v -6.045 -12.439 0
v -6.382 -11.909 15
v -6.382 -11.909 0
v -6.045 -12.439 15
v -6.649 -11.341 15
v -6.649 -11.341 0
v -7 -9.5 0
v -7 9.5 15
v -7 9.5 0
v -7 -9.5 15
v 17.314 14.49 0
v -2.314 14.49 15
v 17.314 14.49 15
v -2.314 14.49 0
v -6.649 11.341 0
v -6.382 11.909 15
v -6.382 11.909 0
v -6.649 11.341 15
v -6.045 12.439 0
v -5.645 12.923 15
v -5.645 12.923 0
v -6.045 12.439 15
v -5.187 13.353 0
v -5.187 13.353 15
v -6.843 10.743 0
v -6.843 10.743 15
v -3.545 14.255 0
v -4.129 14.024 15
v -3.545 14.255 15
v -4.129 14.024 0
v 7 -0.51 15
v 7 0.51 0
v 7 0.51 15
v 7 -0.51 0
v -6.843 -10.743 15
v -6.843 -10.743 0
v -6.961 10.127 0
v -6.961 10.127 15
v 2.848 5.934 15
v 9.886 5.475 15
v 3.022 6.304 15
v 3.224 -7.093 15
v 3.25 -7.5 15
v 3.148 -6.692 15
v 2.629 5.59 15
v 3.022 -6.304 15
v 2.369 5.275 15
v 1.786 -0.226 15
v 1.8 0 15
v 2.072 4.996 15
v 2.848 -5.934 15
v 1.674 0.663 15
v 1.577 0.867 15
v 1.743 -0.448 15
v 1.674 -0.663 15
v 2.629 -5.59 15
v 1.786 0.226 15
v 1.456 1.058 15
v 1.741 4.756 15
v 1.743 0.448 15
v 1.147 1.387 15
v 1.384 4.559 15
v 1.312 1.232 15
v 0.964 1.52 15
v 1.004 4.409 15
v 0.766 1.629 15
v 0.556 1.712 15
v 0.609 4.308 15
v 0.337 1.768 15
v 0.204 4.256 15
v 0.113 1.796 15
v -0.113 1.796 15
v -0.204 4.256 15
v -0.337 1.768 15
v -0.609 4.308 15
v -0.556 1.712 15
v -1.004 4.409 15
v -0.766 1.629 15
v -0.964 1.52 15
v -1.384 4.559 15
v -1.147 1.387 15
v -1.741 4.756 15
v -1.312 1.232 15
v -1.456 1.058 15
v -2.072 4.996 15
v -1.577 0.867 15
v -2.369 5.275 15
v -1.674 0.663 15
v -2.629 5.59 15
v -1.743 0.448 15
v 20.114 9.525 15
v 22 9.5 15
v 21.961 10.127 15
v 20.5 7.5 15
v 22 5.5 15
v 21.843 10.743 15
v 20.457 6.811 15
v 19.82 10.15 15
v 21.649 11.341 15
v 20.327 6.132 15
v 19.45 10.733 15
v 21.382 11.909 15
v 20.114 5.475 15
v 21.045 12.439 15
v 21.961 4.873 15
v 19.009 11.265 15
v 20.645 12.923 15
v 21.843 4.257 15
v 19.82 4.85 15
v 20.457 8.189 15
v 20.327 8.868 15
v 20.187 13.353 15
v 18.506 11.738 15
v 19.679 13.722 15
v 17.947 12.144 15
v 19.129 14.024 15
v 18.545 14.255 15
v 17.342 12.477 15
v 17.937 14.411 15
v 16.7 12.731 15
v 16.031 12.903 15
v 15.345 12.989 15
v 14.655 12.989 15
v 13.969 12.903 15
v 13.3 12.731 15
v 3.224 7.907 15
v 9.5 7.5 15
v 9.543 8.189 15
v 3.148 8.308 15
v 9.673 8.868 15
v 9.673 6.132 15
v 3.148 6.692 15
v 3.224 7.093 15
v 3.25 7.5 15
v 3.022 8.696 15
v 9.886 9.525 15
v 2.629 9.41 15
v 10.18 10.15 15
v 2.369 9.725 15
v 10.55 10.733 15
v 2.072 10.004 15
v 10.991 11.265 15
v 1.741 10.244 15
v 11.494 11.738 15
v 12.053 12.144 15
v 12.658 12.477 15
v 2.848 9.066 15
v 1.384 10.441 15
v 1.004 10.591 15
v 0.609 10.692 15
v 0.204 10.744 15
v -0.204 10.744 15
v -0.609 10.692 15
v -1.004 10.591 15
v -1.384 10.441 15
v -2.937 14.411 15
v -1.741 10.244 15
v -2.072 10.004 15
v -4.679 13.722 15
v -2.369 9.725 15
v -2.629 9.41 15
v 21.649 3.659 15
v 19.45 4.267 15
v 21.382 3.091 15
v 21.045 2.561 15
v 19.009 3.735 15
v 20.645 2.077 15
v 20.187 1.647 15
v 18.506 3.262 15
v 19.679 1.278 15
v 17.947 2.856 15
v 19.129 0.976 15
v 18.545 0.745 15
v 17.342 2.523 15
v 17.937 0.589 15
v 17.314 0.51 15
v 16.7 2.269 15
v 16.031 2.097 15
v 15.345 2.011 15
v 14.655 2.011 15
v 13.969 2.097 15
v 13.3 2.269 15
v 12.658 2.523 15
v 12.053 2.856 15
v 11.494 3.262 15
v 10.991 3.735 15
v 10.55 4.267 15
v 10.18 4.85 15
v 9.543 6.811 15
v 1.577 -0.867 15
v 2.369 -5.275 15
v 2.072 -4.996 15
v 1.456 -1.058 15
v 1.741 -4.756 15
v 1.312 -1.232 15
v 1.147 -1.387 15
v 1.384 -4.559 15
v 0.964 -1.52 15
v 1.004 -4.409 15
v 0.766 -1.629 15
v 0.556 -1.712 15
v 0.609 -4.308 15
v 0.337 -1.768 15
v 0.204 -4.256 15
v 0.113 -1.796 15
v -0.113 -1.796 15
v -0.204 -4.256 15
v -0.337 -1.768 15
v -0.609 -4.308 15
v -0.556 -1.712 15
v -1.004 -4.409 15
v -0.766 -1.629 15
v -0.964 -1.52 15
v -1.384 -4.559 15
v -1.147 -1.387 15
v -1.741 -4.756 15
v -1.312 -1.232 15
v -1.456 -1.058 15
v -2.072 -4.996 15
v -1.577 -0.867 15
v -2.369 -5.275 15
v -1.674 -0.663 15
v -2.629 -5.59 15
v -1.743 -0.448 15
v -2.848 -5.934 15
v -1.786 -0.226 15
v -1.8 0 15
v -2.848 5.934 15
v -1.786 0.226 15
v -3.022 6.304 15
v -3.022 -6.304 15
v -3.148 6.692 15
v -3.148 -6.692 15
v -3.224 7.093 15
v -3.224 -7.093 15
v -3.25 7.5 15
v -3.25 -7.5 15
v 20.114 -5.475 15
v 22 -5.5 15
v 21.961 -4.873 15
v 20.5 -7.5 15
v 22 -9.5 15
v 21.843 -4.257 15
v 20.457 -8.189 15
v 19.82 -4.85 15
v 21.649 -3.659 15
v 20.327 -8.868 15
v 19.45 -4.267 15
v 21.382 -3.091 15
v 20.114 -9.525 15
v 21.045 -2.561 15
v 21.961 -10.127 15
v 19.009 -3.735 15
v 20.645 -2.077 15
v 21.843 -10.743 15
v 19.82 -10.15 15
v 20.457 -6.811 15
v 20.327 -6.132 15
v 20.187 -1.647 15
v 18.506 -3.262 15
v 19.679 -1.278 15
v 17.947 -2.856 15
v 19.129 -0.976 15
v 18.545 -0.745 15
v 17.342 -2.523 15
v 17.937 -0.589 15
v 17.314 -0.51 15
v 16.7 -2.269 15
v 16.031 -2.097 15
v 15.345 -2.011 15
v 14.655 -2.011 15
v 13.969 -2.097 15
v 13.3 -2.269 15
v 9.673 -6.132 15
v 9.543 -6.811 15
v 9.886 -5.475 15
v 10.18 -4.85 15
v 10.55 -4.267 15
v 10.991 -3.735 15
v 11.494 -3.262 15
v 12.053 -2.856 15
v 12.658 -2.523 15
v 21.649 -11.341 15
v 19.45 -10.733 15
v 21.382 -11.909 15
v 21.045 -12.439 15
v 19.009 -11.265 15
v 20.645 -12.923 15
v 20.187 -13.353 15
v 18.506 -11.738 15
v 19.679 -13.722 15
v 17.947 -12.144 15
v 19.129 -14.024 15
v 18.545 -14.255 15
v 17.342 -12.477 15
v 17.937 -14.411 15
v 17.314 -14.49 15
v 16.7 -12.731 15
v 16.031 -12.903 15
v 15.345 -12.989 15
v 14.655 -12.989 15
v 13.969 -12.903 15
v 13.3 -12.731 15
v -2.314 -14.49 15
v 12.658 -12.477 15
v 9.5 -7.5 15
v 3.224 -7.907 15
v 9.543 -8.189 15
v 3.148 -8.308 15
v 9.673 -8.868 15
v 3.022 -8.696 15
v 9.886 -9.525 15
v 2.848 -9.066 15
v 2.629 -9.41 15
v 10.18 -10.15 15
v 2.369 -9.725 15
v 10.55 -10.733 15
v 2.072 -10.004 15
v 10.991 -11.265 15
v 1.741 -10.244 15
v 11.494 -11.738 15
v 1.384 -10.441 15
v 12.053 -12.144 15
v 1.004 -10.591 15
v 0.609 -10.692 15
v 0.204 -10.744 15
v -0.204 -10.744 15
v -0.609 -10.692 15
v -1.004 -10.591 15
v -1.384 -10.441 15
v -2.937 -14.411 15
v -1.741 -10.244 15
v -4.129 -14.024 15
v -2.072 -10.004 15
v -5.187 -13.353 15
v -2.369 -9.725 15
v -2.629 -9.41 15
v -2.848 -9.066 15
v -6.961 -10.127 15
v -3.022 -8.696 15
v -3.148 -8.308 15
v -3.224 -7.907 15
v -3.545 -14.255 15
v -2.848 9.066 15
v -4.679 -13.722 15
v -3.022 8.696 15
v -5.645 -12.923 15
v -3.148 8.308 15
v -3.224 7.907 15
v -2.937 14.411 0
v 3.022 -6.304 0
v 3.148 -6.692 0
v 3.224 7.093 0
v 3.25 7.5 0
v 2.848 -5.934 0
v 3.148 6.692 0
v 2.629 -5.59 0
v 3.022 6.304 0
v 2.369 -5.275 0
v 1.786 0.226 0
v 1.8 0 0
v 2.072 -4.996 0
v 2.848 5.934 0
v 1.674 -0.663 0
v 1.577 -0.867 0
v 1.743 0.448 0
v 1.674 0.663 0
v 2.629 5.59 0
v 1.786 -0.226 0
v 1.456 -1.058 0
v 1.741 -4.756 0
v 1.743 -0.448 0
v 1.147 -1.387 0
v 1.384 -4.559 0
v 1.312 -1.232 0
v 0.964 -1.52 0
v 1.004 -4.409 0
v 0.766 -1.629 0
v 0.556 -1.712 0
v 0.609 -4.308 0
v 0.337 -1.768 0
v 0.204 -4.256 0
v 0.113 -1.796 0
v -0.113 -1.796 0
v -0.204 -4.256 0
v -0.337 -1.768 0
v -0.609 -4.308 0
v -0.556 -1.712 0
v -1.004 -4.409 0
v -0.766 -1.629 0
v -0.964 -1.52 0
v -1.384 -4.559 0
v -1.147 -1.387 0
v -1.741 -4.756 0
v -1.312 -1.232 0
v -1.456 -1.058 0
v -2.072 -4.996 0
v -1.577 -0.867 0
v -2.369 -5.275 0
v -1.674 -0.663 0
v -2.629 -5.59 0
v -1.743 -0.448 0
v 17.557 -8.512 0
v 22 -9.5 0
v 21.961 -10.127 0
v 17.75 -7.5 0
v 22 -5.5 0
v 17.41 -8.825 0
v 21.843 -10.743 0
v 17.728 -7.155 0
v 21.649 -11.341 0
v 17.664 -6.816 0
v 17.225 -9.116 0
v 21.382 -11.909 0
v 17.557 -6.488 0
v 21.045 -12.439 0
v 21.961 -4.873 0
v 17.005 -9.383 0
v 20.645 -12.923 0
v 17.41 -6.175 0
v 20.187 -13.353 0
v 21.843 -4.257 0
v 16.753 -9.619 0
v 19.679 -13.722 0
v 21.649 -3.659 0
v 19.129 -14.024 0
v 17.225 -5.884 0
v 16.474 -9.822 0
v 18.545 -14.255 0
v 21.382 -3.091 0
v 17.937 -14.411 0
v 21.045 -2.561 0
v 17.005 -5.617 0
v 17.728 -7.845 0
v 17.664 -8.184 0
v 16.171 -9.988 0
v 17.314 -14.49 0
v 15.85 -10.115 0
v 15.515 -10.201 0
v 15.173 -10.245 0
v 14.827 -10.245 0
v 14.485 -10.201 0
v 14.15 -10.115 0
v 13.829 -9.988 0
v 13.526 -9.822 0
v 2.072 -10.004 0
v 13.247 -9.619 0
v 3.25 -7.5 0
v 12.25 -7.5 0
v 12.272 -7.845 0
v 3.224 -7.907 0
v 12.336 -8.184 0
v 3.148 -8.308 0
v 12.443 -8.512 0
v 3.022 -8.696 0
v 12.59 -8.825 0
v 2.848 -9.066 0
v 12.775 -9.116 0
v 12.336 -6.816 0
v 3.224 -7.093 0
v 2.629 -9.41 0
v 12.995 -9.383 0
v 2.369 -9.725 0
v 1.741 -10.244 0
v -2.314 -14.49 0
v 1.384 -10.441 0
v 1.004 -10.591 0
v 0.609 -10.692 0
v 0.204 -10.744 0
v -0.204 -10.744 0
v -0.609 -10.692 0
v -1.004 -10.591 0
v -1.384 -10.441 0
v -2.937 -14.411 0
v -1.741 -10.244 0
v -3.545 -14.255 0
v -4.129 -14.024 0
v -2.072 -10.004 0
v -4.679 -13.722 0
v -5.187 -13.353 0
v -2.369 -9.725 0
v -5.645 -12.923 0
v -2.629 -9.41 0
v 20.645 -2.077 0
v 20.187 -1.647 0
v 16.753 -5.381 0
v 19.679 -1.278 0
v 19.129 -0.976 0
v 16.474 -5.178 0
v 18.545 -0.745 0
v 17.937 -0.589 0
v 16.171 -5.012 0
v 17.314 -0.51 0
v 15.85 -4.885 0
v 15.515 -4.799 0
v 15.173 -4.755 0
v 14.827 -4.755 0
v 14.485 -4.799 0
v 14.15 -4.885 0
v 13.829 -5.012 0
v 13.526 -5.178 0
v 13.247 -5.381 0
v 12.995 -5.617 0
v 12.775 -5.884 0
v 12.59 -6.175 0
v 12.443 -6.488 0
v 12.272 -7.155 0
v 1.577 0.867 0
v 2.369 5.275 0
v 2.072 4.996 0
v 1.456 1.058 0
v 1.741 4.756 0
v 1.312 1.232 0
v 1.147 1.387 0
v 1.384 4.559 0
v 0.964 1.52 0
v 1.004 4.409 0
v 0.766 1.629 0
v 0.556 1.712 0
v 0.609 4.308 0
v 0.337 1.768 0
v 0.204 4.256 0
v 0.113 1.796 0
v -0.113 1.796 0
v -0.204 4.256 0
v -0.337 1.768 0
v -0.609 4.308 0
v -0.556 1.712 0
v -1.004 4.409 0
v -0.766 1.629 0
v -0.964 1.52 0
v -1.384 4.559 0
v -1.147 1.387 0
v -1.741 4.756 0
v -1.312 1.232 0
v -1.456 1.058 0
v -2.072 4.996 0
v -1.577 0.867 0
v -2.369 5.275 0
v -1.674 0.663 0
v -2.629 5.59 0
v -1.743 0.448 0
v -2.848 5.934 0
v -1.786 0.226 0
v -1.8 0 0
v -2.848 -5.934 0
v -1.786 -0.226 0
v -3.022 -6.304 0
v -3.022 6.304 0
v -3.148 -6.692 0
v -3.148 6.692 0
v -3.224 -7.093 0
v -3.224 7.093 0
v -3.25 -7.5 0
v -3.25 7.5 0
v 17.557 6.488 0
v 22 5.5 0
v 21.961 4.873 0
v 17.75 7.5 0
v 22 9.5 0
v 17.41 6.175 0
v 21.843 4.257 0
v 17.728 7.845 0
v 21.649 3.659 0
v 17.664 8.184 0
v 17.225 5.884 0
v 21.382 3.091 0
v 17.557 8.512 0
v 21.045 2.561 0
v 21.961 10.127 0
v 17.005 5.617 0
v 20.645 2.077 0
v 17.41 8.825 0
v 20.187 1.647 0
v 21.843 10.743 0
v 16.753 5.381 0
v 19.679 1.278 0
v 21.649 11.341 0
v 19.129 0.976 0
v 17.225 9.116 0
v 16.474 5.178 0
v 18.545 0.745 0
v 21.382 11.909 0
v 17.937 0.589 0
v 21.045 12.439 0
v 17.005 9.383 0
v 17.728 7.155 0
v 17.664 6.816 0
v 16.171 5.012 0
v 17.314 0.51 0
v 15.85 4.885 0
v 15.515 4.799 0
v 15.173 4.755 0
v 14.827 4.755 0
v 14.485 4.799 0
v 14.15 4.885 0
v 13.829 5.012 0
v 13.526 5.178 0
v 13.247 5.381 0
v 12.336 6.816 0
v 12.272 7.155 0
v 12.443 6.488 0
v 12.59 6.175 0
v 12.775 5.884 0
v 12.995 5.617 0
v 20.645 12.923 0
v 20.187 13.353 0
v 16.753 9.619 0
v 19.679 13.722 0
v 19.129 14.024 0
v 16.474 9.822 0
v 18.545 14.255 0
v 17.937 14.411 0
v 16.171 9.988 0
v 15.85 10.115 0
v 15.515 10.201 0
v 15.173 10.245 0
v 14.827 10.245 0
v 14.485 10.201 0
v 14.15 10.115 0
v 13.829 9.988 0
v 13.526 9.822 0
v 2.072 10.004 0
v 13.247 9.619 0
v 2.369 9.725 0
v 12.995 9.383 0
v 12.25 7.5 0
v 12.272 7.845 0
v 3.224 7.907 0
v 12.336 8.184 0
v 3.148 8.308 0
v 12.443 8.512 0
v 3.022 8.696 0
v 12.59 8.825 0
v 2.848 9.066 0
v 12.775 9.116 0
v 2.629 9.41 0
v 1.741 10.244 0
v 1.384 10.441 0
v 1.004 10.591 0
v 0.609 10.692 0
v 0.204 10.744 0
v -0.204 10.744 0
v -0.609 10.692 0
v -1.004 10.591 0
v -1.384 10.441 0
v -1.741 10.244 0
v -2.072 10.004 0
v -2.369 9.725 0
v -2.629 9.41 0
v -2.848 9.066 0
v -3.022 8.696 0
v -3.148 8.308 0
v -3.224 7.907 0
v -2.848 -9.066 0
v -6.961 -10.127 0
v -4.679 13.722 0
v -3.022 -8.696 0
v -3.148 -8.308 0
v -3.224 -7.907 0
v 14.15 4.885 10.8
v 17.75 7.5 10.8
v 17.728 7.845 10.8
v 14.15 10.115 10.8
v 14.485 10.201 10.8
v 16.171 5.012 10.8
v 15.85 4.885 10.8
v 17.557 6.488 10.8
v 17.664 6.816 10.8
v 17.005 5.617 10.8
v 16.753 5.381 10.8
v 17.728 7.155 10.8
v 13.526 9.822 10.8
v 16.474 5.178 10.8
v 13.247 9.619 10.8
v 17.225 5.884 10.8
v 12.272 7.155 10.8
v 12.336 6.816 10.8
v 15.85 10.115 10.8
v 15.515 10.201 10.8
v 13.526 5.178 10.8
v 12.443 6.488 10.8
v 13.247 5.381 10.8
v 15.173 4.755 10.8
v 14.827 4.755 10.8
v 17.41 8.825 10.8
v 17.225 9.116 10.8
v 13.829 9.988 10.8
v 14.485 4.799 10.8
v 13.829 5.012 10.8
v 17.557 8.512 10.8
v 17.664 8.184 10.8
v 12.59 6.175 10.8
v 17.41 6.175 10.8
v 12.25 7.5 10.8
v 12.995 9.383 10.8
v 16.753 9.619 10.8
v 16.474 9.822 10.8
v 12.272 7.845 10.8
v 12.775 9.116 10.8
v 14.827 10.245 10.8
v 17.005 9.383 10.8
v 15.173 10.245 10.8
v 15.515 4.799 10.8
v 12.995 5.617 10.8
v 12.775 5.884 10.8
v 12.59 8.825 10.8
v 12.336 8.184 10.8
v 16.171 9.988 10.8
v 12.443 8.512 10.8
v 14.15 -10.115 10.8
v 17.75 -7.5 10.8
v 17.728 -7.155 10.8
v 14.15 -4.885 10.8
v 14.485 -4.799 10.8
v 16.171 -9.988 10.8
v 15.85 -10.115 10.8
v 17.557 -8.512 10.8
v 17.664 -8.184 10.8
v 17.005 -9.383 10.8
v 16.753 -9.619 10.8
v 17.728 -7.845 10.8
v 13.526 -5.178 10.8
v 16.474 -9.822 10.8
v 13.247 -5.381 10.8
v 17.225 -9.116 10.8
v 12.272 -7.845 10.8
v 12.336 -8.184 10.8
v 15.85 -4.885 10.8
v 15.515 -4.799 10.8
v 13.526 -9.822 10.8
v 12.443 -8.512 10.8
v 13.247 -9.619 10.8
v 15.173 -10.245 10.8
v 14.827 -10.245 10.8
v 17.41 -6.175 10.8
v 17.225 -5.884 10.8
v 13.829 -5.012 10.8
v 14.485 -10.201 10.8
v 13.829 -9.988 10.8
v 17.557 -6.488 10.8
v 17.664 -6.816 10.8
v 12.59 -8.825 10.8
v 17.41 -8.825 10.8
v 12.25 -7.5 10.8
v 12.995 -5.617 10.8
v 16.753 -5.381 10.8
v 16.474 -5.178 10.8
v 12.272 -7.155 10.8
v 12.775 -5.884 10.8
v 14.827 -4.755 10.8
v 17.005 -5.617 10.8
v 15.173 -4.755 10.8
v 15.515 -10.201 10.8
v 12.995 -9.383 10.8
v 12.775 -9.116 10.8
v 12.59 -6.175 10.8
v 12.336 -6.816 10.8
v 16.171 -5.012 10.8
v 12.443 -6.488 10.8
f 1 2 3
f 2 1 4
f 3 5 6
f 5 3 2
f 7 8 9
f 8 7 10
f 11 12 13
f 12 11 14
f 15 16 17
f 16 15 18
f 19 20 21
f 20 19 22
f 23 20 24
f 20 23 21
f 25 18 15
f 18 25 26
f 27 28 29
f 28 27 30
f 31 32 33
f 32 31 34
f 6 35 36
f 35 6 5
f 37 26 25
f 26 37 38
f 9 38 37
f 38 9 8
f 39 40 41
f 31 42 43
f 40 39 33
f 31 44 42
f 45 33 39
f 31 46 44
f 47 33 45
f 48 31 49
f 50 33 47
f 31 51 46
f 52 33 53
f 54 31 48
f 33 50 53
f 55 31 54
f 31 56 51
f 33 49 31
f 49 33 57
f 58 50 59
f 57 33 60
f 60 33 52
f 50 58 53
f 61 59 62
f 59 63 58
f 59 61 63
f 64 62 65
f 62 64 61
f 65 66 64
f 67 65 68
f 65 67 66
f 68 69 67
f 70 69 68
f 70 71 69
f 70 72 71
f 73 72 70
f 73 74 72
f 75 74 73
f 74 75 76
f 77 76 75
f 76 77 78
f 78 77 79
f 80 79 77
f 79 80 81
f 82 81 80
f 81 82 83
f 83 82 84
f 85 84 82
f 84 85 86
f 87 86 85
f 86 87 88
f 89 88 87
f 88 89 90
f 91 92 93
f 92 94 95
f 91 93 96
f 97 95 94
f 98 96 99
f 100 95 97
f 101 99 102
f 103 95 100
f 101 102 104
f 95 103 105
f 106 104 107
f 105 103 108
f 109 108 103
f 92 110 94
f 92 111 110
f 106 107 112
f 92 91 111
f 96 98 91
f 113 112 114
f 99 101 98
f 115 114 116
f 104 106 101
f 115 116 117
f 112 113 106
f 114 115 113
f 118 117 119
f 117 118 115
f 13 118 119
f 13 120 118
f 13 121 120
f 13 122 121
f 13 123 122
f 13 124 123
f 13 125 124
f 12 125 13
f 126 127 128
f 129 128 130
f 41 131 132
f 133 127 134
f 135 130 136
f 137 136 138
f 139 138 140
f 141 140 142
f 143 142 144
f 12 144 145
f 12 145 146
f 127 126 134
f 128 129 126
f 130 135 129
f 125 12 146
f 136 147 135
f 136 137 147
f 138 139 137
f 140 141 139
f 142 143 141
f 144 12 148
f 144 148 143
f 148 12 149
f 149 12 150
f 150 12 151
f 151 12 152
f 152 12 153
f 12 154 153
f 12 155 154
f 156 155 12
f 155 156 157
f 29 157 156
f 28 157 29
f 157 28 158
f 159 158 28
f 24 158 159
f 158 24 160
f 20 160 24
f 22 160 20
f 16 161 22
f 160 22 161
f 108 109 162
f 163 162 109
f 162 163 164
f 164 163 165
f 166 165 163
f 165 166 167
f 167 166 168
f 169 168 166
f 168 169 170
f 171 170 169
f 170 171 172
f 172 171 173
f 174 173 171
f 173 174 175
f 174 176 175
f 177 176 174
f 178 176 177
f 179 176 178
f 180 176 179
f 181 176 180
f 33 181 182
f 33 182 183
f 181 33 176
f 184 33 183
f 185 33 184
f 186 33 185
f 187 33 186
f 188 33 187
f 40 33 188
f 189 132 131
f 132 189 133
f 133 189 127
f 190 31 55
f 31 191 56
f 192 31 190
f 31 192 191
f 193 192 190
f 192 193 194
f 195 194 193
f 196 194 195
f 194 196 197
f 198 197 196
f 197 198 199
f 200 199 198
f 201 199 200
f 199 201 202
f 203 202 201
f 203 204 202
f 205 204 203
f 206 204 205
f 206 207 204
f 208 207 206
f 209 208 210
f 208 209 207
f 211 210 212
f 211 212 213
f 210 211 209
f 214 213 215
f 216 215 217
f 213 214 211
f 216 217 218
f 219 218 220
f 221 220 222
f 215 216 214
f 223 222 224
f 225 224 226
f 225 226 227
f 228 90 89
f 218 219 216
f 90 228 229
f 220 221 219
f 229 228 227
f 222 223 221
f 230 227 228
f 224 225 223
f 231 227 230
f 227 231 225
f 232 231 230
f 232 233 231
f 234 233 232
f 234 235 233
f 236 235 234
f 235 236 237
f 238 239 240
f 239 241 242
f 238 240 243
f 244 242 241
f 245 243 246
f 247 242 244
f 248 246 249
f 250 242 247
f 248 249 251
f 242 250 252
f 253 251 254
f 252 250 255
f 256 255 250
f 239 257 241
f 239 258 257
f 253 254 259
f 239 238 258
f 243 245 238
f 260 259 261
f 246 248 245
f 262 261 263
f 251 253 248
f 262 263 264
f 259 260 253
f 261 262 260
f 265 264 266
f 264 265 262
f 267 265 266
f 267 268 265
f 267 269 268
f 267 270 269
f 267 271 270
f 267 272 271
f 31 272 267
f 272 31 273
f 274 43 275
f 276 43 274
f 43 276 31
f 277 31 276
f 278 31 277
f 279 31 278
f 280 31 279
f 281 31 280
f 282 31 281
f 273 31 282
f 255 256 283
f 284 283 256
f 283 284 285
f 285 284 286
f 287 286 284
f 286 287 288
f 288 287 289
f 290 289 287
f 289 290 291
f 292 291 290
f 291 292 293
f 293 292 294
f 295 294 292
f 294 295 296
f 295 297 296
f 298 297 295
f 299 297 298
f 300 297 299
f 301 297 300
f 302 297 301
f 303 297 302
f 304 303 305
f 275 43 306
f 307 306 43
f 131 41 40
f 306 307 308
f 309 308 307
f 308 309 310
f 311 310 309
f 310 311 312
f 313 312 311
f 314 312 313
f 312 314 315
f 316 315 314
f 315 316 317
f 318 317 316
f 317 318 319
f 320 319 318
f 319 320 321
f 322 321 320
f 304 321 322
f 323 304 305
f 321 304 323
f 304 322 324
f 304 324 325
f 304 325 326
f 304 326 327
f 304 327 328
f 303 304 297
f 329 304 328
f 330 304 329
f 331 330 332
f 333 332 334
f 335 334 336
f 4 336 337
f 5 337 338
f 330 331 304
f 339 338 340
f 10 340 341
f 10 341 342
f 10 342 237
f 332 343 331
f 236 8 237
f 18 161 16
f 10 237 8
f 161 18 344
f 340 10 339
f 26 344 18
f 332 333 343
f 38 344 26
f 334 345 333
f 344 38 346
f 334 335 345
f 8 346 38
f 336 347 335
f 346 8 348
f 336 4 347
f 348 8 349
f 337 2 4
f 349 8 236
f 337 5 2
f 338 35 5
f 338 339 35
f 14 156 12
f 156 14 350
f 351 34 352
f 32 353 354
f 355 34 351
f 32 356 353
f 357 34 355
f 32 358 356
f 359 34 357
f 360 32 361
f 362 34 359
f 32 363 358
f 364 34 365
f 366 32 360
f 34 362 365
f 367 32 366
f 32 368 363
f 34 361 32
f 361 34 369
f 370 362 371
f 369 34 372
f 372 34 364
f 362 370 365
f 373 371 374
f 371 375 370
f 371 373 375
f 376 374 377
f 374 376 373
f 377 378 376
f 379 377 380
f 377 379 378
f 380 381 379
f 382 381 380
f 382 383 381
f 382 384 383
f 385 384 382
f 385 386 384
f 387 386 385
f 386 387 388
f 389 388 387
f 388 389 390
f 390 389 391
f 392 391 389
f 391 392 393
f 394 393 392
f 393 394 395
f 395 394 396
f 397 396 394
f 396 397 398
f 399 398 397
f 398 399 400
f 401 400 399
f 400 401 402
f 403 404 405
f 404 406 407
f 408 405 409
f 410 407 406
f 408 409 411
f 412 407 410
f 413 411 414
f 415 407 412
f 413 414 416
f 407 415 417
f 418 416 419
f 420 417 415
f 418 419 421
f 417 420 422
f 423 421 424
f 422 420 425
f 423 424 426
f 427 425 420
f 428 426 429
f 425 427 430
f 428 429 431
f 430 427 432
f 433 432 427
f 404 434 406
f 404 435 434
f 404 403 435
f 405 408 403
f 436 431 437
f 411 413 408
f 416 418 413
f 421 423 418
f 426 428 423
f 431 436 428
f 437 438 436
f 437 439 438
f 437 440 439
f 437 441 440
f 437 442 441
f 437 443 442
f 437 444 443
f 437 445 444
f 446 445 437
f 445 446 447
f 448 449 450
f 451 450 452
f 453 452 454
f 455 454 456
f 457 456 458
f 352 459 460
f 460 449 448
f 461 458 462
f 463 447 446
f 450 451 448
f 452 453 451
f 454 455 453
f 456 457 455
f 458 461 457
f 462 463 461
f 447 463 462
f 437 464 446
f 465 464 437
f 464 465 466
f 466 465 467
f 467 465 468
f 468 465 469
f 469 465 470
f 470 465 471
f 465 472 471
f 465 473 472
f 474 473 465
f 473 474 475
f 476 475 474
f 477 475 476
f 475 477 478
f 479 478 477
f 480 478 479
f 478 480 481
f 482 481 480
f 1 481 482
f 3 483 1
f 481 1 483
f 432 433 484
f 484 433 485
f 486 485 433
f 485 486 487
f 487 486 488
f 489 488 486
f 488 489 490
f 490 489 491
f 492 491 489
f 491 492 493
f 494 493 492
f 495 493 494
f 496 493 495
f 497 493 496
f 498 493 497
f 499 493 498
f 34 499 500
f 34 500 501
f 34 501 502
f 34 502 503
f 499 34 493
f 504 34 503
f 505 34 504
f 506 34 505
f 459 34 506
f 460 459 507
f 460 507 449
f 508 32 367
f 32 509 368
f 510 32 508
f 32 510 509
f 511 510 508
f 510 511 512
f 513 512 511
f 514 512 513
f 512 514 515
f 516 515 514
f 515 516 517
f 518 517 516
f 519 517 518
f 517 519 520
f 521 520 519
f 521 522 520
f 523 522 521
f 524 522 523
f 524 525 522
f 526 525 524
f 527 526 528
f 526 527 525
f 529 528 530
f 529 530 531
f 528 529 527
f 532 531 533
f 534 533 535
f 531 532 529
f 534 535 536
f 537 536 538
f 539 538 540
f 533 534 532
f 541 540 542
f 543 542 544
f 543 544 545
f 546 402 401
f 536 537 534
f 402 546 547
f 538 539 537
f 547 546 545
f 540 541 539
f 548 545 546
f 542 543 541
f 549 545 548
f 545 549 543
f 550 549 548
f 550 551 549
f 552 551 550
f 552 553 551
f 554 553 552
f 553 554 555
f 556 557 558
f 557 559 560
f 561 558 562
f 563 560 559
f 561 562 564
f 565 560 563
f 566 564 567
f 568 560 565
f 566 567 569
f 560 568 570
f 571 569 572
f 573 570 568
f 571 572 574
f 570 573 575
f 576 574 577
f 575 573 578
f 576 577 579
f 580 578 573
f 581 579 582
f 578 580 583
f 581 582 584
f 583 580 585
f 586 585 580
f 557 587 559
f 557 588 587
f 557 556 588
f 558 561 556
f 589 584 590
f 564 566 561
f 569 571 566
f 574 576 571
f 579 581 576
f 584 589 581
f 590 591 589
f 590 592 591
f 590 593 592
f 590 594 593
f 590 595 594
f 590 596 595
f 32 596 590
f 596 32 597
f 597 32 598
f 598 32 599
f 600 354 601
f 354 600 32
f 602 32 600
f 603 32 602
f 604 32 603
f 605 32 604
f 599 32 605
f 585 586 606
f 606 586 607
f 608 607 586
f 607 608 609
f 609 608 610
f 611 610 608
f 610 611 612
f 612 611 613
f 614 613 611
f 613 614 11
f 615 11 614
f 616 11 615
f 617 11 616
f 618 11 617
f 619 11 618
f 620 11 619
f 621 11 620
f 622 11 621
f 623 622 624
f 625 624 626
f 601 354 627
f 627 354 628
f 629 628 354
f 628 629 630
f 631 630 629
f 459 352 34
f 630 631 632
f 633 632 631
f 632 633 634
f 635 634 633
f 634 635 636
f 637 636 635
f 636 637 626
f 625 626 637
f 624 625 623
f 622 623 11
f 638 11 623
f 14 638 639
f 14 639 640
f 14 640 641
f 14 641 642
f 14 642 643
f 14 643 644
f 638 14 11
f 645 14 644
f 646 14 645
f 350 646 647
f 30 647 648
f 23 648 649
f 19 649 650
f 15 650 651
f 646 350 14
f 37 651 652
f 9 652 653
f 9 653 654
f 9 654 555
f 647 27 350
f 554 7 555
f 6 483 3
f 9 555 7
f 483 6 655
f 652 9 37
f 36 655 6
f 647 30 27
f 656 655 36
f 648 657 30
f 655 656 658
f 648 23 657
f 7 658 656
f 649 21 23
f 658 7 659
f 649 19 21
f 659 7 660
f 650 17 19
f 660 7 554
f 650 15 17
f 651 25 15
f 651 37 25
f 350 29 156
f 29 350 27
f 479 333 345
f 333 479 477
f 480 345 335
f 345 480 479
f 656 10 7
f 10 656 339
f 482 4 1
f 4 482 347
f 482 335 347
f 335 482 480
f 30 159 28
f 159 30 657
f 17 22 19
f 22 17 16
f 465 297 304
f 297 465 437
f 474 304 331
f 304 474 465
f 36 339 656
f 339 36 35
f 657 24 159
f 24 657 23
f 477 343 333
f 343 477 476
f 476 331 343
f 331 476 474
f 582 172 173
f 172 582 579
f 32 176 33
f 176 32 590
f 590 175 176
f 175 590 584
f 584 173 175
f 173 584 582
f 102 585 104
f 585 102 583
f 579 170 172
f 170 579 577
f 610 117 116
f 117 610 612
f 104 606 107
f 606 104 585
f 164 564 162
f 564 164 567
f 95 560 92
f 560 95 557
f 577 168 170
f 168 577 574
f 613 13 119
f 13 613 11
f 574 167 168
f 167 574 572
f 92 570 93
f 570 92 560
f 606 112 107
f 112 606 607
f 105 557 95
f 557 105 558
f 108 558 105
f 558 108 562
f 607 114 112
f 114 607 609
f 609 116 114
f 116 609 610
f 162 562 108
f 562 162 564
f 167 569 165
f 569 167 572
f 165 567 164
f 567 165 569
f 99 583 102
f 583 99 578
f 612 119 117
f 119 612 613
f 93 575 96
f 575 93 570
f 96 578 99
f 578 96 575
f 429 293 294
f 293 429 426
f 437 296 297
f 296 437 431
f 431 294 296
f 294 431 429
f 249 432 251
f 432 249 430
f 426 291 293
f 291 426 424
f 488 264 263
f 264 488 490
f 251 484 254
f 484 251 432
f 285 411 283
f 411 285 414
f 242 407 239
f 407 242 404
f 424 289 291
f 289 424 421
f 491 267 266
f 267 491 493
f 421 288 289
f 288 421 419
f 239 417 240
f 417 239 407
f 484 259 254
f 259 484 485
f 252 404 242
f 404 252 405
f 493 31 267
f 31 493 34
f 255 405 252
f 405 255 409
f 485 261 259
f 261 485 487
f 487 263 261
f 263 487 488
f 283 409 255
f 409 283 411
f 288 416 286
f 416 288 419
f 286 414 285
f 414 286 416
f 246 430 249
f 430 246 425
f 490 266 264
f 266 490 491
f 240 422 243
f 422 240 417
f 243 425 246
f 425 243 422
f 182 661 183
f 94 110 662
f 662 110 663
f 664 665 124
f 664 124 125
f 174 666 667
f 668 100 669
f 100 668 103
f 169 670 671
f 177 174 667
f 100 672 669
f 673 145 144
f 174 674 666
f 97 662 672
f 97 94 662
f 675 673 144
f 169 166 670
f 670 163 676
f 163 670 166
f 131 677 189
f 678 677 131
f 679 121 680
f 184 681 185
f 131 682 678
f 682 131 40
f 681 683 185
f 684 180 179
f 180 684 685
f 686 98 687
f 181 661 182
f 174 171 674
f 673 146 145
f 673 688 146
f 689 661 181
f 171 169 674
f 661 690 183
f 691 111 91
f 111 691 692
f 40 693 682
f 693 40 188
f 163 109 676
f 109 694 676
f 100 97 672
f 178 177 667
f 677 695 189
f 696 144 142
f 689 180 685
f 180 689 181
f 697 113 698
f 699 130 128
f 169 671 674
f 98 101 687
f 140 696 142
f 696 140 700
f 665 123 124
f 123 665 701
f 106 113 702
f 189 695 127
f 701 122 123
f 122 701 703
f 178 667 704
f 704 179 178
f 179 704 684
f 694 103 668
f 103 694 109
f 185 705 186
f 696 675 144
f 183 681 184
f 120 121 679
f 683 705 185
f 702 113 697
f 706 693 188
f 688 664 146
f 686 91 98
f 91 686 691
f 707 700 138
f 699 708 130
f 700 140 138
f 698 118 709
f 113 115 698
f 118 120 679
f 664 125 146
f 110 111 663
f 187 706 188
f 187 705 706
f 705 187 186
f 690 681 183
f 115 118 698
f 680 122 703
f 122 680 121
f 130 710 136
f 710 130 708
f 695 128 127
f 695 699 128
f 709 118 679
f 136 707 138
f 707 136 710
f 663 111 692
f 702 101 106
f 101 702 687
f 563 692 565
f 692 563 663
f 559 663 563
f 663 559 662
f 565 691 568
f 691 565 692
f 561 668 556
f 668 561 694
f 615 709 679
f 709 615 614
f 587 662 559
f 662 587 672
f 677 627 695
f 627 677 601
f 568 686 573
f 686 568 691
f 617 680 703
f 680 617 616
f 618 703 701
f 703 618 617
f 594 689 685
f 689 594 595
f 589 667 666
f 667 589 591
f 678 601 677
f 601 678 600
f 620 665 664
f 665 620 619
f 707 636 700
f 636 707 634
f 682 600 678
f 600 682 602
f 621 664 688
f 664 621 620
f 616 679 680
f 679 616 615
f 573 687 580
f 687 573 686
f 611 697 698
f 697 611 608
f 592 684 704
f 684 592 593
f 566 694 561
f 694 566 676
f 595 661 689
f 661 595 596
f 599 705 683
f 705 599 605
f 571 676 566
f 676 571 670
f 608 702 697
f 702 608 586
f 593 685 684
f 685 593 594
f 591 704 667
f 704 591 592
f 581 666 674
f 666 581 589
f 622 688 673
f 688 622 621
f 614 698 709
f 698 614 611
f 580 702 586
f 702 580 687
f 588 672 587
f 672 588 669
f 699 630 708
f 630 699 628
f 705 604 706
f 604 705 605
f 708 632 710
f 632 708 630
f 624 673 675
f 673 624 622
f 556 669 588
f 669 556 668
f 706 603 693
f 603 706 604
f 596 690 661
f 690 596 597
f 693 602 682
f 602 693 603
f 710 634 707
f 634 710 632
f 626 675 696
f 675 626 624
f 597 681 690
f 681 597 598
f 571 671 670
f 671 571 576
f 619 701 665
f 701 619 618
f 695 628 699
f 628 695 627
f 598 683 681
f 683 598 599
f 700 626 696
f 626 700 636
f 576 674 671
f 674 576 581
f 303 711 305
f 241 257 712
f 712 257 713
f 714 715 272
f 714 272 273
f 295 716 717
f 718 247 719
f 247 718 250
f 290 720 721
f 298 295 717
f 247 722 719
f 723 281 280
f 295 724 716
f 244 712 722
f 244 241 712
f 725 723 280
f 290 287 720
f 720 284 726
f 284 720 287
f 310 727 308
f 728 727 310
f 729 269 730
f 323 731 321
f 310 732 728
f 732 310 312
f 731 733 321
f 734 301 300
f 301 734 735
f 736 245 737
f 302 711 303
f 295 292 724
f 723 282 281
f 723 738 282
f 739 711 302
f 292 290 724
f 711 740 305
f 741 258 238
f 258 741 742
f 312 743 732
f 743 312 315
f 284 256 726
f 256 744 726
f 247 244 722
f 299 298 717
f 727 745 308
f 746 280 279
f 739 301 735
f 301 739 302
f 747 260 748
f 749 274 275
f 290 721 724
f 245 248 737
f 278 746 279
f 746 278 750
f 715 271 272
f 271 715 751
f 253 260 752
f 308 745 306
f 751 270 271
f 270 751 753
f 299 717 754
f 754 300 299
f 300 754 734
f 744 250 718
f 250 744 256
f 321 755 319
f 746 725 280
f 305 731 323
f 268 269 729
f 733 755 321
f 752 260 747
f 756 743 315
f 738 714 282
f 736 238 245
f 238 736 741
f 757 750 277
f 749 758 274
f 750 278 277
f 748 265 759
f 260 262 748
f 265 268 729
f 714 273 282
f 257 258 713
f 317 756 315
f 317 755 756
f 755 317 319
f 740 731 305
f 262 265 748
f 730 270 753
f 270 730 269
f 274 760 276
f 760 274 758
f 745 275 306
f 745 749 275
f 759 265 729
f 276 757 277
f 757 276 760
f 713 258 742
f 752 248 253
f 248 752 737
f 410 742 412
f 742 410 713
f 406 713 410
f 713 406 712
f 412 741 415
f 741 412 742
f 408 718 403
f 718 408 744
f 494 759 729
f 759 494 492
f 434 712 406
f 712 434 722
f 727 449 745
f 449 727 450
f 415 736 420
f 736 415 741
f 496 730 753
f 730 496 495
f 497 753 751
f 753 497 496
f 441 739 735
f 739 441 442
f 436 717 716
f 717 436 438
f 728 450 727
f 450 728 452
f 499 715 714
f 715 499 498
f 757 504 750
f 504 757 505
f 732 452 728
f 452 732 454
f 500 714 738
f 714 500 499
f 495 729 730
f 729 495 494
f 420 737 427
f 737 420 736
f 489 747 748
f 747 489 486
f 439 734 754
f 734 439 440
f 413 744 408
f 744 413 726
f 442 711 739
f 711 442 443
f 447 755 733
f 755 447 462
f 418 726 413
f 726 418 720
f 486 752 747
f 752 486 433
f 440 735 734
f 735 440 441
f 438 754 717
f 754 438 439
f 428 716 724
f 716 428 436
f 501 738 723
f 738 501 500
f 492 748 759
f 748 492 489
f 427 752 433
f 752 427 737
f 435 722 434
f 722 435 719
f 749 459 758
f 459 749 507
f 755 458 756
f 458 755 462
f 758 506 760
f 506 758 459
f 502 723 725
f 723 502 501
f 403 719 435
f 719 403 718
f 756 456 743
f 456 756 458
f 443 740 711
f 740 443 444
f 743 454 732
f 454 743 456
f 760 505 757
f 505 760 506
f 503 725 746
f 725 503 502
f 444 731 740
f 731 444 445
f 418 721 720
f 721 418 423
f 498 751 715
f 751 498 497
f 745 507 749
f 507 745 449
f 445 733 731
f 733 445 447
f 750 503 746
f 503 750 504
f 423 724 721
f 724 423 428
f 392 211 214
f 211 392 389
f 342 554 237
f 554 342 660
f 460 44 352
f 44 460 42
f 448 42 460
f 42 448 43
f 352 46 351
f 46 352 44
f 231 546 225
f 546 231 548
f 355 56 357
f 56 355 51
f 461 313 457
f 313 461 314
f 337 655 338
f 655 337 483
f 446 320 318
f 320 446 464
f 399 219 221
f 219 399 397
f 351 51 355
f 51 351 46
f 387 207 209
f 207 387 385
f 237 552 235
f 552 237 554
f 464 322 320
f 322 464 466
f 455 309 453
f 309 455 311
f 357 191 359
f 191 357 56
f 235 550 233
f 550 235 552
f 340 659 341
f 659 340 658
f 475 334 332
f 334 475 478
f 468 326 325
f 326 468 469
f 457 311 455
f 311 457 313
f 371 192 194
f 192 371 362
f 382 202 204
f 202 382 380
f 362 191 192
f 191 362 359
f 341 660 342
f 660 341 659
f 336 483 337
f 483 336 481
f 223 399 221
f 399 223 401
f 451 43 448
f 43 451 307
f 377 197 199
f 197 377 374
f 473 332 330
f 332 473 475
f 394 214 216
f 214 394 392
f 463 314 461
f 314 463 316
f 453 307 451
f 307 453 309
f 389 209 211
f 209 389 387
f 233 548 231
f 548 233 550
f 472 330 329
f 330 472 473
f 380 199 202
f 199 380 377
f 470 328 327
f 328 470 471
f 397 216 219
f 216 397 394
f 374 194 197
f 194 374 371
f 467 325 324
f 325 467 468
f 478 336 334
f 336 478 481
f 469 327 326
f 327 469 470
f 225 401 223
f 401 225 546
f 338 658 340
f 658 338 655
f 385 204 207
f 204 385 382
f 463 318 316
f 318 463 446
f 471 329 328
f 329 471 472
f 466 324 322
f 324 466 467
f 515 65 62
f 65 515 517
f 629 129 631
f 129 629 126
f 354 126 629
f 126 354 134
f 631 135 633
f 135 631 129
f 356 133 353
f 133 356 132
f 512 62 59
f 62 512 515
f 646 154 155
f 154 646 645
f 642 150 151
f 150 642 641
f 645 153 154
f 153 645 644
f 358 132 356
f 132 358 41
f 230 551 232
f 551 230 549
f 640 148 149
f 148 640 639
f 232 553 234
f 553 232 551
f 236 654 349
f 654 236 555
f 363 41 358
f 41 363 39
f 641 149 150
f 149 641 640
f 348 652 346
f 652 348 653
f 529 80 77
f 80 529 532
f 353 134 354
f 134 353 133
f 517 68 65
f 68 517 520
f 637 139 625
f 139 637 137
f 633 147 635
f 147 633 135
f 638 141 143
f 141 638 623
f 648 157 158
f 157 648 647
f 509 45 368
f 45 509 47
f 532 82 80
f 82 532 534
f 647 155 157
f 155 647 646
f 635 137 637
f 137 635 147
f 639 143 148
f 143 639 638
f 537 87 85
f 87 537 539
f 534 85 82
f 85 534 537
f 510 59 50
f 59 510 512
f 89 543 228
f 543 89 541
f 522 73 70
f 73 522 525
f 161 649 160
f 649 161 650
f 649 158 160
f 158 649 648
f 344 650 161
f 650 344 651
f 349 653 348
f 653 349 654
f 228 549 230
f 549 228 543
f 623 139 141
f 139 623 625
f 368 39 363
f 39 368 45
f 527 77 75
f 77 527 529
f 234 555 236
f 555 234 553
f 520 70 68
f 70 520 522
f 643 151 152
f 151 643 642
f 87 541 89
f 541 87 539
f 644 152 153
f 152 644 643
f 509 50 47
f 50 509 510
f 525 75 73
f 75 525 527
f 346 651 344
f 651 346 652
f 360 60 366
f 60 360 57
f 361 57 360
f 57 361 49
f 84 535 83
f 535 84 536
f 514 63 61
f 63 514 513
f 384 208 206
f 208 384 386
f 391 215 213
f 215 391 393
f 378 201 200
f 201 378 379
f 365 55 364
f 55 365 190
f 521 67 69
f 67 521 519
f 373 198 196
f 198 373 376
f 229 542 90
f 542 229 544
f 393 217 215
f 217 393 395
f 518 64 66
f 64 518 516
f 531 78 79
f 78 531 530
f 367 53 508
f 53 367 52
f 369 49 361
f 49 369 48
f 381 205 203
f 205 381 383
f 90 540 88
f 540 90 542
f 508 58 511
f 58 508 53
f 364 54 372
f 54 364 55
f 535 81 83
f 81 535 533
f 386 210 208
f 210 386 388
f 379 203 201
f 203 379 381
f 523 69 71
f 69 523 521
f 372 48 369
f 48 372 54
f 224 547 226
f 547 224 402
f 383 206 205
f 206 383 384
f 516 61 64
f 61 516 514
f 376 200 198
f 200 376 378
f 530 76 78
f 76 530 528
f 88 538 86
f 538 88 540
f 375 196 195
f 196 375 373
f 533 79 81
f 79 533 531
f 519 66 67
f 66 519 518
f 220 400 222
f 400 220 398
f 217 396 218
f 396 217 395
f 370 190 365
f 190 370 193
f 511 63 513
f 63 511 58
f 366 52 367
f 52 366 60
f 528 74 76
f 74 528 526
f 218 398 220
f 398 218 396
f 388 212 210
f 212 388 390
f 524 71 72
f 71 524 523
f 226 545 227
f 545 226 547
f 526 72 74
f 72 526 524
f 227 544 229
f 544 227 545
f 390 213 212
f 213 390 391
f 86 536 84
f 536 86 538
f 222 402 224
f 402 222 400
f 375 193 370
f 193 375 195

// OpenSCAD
$fn = 50;


difference() {
	union() {
		hull() {
			translate(v = [-2.0000000000, 9.5000000000, 0]) {
				cylinder(h = 15, r = 5);
			}
			translate(v = [2.0000000000, 9.5000000000, 0]) {
				cylinder(h = 15, r = 5);
			}
			translate(v = [-2.0000000000, -9.5000000000, 0]) {
				cylinder(h = 15, r = 5);
			}
			translate(v = [2.0000000000, -9.5000000000, 0]) {
				cylinder(h = 15, r = 5);
			}
		}
		translate(v = [7.5000000000, 7.5000000000, 0]) {
			hull() {
				translate(v = [-9.5000000000, 2.0000000000, 0]) {
					cylinder(h = 15, r = 5);
				}
				translate(v = [9.5000000000, 2.0000000000, 0]) {
					cylinder(h = 15, r = 5);
				}
				translate(v = [-9.5000000000, -2.0000000000, 0]) {
					cylinder(h = 15, r = 5);
				}
				translate(v = [9.5000000000, -2.0000000000, 0]) {
					cylinder(h = 15, r = 5);
				}
			}
		}
		translate(v = [7.5000000000, -7.5000000000, 0]) {
			hull() {
				translate(v = [-9.5000000000, 2.0000000000, 0]) {
					cylinder(h = 15, r = 5);
				}
				translate(v = [9.5000000000, 2.0000000000, 0]) {
					cylinder(h = 15, r = 5);
				}
				translate(v = [-9.5000000000, -2.0000000000, 0]) {
					cylinder(h = 15, r = 5);
				}
				translate(v = [9.5000000000, -2.0000000000, 0]) {
					cylinder(h = 15, r = 5);
				}
			}
		}
	}
	union() {
		translate(v = [15.0000000000, 7.5000000000, 15]) {
			rotate(a = [0, 0, 0]) {
				difference() {
					union() {
						#translate(v = [0, 0, -15.0000000000]) {
							cylinder(h = 15, r = 2.2500000000);
						}
						#translate(v = [0, 0, -4.2000000000]) {
							cylinder(h = 4.2000000000, r1 = 2.7500000000, r2 = 5.5000000000);
						}
						#translate(v = [0, 0, -15.0000000000]) {
							cylinder(h = 15, r = 2.7500000000);
						}
						#translate(v = [0, 0, -15.0000000000]) {
							cylinder(h = 15, r = 2.2500000000);
						}
					}
					union();
				}
			}
		}
		translate(v = [15.0000000000, -7.5000000000, 15]) {
			rotate(a = [0, 0, 0]) {
				difference() {
					union() {
						#translate(v = [0, 0, -15.0000000000]) {
							cylinder(h = 15, r = 2.2500000000);
						}
						#translate(v = [0, 0, -4.2000000000]) {
							cylinder(h = 4.2000000000, r1 = 2.7500000000, r2 = 5.5000000000);
						}
						#translate(v = [0, 0, -15.0000000000]) {
							cylinder(h = 15, r = 2.7500000000);
						}
						#translate(v = [0, 0, -15.0000000000]) {
							cylinder(h = 15, r = 2.2500000000);
						}
					}
					union();
				}
			}
		}
		translate(v = [0.0000000000, -7.5000000000, 0]) {
			translate(v = [0, 0, -100]) {
				cylinder(h = 200, r = 3.2500000000);
			}
		}
		translate(v = [0.0000000000, 7.5000000000, 0]) {
			translate(v = [0, 0, -100]) {
				cylinder(h = 200, r = 3.2500000000);
			}
		}
		translate(v = [0.0000000000, -7.5000000000, 0]) {
			translate(v = [0, 0, -100]) {
				cylinder(h = 200, r = 1.8000000000);
			}
		}
		translate(v = [0, 0, -100]) {
			cylinder(h = 200, r = 1.8000000000);
		}
		translate(v = [0.0000000000, 7.5000000000, 0]) {
			translate(v = [0, 0, -100]) {
				cylinder(h = 200, r = 1.8000000000);
			}
		}
	}
}
